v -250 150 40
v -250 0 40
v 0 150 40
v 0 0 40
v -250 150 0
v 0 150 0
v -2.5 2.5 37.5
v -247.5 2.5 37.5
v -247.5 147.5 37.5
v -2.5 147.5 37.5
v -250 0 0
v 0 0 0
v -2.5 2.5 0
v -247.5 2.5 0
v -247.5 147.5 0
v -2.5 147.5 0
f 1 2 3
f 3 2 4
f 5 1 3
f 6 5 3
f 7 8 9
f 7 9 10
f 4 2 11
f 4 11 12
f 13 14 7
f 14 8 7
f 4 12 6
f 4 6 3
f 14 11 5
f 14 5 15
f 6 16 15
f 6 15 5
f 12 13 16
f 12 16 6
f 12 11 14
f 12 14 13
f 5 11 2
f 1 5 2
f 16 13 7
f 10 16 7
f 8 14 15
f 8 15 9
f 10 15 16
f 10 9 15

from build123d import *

# Parameters (mm, degrees)
F0_W     = 250
F0_H     = 40
F1_DEPTH = 150
F2_T     = -2.5


# Not quite as in the source:
# - the program builds the solid bodies; features that only make, move or delete a surface that nothing else refers to are left out


with BuildPart() as f1:
    # F0 (on Front) → F1 (new body)
    with BuildSketch(Plane.XZ):
        with Locations((-125, 20)):
            Rectangle(F0_W, F0_H)
    extrude(amount=-F1_DEPTH)

    # F2
    f2_openings = [f1.faces().sort_by_distance(p)[0] for p in [
        (-125, 75, 0),
    ]]
    offset(amount=F2_T, openings=f2_openings)


solid = f1.part
